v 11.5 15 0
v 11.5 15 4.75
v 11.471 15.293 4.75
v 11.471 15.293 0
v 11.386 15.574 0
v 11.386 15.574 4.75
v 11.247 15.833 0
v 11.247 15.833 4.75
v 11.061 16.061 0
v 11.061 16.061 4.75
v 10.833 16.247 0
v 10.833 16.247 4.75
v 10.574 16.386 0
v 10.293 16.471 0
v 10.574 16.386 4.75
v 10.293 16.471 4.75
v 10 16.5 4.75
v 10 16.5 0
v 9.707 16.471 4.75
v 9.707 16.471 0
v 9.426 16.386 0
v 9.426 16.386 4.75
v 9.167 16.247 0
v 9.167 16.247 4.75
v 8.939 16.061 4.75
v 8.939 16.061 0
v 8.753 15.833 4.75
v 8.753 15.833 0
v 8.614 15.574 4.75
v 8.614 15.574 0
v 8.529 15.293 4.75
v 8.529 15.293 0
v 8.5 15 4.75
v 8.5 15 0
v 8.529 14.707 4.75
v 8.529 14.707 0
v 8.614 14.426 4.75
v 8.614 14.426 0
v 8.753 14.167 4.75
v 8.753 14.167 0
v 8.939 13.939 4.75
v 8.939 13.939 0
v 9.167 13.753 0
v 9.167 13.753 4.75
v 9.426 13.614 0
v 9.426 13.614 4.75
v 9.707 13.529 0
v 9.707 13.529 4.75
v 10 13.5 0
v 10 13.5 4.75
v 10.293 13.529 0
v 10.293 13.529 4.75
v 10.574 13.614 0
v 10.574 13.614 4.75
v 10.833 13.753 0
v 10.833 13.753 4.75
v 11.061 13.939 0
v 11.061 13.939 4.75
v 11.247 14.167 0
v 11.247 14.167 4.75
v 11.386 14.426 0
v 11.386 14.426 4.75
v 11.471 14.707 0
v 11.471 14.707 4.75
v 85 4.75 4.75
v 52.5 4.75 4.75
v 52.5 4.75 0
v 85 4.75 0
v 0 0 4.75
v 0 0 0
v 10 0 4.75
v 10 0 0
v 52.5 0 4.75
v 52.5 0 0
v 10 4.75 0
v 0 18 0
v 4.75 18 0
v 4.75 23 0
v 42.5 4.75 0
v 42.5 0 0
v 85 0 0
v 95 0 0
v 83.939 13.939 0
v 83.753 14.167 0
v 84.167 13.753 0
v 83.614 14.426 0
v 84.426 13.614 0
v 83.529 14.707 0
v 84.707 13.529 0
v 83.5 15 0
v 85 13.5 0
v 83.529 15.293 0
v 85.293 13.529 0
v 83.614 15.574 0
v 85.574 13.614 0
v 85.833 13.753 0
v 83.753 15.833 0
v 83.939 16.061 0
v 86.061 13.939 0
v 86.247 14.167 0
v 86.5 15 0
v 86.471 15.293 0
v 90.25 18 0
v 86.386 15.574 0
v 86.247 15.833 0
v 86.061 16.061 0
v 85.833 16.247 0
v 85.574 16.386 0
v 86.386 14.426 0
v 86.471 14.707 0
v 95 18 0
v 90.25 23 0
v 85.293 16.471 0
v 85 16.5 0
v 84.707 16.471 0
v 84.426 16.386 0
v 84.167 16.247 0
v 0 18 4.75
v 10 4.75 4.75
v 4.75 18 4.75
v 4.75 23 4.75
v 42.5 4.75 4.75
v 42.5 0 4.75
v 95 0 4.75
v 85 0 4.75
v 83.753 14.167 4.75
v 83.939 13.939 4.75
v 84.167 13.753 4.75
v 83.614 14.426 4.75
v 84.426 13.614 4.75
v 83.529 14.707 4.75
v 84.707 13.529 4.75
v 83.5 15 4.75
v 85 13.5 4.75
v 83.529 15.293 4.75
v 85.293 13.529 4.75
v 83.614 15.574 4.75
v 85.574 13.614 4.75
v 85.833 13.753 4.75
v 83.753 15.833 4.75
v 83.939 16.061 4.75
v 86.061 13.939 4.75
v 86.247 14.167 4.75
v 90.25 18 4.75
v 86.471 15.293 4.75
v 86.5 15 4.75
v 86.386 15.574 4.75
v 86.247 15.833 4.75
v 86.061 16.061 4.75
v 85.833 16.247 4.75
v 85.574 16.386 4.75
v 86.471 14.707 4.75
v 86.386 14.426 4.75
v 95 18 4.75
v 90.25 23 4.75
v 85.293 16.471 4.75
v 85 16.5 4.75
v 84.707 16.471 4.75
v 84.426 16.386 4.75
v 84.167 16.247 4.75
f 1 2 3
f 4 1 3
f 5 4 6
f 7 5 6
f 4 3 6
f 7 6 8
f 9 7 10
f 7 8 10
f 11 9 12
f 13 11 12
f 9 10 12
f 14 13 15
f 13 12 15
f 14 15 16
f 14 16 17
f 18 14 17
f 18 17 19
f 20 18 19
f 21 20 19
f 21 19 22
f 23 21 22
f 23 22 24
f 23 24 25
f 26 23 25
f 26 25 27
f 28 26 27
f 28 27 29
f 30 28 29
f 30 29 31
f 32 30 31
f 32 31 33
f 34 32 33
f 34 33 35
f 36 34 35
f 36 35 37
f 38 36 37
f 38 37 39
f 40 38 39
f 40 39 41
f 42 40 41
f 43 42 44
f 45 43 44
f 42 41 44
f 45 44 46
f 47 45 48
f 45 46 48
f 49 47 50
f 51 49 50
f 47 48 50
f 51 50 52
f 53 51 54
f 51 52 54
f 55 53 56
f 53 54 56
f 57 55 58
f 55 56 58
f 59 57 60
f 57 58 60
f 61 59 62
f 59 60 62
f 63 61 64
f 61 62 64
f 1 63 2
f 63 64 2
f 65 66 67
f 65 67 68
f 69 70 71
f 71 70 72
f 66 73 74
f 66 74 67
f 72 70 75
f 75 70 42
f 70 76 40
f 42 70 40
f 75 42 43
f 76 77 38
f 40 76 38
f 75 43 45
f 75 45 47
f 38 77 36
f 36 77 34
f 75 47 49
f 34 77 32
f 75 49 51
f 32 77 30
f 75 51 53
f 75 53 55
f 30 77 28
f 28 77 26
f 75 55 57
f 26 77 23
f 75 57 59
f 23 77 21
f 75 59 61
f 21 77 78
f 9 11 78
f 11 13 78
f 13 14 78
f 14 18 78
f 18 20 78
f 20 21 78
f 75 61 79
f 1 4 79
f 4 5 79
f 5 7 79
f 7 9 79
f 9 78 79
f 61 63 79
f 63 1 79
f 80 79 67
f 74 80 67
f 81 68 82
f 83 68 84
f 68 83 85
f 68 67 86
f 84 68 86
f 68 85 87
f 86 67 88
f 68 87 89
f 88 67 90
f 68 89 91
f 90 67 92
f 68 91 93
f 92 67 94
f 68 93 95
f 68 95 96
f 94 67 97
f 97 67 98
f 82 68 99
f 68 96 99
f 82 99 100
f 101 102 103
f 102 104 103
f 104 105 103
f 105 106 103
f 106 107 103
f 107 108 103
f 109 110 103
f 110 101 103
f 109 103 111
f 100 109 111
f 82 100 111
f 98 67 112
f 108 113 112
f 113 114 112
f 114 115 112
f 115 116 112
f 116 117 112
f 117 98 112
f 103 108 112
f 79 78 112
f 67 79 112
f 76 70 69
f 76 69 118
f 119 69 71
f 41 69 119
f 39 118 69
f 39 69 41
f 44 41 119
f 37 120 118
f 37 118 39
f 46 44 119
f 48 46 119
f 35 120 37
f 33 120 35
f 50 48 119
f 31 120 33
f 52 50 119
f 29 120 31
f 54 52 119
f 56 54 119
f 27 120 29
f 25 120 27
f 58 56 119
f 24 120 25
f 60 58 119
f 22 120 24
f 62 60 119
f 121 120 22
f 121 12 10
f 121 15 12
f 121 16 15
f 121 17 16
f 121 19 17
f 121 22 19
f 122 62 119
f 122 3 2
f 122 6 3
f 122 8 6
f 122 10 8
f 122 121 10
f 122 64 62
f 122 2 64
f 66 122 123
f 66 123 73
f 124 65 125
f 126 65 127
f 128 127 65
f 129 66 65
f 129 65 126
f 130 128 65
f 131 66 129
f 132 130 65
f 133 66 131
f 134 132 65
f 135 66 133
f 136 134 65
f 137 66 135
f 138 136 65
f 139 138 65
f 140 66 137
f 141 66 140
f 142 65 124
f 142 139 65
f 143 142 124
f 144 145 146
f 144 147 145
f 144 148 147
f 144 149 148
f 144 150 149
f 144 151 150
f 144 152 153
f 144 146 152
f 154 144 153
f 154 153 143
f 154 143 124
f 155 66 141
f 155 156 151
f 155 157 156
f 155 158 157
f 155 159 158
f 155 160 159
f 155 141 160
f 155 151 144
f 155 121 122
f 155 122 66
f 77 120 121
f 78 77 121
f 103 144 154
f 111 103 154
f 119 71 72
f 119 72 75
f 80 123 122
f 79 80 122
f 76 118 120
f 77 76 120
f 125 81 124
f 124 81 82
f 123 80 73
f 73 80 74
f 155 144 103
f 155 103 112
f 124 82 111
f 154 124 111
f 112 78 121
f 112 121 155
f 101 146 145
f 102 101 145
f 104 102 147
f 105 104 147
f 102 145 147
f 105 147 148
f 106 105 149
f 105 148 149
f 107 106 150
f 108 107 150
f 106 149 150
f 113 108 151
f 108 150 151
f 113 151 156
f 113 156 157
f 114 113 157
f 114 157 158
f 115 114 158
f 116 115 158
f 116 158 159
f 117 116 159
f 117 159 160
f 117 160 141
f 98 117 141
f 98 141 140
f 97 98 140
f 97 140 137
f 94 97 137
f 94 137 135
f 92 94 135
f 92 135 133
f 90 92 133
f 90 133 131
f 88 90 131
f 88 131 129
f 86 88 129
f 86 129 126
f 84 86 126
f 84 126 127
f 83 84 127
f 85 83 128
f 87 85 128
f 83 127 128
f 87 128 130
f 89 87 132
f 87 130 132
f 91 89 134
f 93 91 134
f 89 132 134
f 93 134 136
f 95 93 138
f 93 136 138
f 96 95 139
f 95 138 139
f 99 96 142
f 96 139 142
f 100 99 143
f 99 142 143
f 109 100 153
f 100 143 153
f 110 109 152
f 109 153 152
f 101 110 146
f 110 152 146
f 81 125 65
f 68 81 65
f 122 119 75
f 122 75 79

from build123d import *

# Parameters (mm, degrees)
SKETCH1_W           = 95
SKETCH1_H           = 23
BOSS_EXTRUDE1_DEPTH = 4.75
SKETCH2_W           = 32.5
SKETCH2_H           = 4.75
CUT_EXTRUDE1_DEPTH  = 5.75
SKETCH4_R           = 1.5
CUT_EXTRUDE2_DEPTH  = 5.75
SKETCH5_W           = 4.75
SKETCH5_H           = 5
CUT_EXTRUDE3_DEPTH  = 5.75


with BuildPart() as part:
    # Sketch1 → Boss-Extrude1 (new body)
    with BuildSketch(Plane.XY):
        with Locations((47.5, 11.5)):
            Rectangle(SKETCH1_W, SKETCH1_H)
    extrude(amount=BOSS_EXTRUDE1_DEPTH)

    # Sketch2 → Cut-Extrude1 (cut, through all)
    with BuildSketch(Plane.XY.offset(4.75)):
        with Locations((26.25, 2.375)):
            Rectangle(SKETCH2_W, SKETCH2_H)
        with Locations((68.75, 2.375)):
            Rectangle(SKETCH2_W, SKETCH2_H)
    extrude(amount=-CUT_EXTRUDE1_DEPTH, mode=Mode.SUBTRACT)

    # Sketch4 → Cut-Extrude2 (cut, through all)
    with BuildSketch(Plane.XY.offset(4.75)):
        with Locations((10, 15)):
            Circle(SKETCH4_R)
        with Locations((85, 15)):
            Circle(SKETCH4_R)
    extrude(amount=-CUT_EXTRUDE2_DEPTH, mode=Mode.SUBTRACT)

    # Sketch5 → Cut-Extrude3 (cut, through all)
    with BuildSketch(Plane.XY.offset(4.75)):
        with Locations((2.375, 20.5)):
            Rectangle(SKETCH5_W, SKETCH5_H)
        with Locations((92.625, 20.5)):
            Rectangle(SKETCH5_W, SKETCH5_H)
    extrude(amount=-CUT_EXTRUDE3_DEPTH, mode=Mode.SUBTRACT)


solid = part.part
